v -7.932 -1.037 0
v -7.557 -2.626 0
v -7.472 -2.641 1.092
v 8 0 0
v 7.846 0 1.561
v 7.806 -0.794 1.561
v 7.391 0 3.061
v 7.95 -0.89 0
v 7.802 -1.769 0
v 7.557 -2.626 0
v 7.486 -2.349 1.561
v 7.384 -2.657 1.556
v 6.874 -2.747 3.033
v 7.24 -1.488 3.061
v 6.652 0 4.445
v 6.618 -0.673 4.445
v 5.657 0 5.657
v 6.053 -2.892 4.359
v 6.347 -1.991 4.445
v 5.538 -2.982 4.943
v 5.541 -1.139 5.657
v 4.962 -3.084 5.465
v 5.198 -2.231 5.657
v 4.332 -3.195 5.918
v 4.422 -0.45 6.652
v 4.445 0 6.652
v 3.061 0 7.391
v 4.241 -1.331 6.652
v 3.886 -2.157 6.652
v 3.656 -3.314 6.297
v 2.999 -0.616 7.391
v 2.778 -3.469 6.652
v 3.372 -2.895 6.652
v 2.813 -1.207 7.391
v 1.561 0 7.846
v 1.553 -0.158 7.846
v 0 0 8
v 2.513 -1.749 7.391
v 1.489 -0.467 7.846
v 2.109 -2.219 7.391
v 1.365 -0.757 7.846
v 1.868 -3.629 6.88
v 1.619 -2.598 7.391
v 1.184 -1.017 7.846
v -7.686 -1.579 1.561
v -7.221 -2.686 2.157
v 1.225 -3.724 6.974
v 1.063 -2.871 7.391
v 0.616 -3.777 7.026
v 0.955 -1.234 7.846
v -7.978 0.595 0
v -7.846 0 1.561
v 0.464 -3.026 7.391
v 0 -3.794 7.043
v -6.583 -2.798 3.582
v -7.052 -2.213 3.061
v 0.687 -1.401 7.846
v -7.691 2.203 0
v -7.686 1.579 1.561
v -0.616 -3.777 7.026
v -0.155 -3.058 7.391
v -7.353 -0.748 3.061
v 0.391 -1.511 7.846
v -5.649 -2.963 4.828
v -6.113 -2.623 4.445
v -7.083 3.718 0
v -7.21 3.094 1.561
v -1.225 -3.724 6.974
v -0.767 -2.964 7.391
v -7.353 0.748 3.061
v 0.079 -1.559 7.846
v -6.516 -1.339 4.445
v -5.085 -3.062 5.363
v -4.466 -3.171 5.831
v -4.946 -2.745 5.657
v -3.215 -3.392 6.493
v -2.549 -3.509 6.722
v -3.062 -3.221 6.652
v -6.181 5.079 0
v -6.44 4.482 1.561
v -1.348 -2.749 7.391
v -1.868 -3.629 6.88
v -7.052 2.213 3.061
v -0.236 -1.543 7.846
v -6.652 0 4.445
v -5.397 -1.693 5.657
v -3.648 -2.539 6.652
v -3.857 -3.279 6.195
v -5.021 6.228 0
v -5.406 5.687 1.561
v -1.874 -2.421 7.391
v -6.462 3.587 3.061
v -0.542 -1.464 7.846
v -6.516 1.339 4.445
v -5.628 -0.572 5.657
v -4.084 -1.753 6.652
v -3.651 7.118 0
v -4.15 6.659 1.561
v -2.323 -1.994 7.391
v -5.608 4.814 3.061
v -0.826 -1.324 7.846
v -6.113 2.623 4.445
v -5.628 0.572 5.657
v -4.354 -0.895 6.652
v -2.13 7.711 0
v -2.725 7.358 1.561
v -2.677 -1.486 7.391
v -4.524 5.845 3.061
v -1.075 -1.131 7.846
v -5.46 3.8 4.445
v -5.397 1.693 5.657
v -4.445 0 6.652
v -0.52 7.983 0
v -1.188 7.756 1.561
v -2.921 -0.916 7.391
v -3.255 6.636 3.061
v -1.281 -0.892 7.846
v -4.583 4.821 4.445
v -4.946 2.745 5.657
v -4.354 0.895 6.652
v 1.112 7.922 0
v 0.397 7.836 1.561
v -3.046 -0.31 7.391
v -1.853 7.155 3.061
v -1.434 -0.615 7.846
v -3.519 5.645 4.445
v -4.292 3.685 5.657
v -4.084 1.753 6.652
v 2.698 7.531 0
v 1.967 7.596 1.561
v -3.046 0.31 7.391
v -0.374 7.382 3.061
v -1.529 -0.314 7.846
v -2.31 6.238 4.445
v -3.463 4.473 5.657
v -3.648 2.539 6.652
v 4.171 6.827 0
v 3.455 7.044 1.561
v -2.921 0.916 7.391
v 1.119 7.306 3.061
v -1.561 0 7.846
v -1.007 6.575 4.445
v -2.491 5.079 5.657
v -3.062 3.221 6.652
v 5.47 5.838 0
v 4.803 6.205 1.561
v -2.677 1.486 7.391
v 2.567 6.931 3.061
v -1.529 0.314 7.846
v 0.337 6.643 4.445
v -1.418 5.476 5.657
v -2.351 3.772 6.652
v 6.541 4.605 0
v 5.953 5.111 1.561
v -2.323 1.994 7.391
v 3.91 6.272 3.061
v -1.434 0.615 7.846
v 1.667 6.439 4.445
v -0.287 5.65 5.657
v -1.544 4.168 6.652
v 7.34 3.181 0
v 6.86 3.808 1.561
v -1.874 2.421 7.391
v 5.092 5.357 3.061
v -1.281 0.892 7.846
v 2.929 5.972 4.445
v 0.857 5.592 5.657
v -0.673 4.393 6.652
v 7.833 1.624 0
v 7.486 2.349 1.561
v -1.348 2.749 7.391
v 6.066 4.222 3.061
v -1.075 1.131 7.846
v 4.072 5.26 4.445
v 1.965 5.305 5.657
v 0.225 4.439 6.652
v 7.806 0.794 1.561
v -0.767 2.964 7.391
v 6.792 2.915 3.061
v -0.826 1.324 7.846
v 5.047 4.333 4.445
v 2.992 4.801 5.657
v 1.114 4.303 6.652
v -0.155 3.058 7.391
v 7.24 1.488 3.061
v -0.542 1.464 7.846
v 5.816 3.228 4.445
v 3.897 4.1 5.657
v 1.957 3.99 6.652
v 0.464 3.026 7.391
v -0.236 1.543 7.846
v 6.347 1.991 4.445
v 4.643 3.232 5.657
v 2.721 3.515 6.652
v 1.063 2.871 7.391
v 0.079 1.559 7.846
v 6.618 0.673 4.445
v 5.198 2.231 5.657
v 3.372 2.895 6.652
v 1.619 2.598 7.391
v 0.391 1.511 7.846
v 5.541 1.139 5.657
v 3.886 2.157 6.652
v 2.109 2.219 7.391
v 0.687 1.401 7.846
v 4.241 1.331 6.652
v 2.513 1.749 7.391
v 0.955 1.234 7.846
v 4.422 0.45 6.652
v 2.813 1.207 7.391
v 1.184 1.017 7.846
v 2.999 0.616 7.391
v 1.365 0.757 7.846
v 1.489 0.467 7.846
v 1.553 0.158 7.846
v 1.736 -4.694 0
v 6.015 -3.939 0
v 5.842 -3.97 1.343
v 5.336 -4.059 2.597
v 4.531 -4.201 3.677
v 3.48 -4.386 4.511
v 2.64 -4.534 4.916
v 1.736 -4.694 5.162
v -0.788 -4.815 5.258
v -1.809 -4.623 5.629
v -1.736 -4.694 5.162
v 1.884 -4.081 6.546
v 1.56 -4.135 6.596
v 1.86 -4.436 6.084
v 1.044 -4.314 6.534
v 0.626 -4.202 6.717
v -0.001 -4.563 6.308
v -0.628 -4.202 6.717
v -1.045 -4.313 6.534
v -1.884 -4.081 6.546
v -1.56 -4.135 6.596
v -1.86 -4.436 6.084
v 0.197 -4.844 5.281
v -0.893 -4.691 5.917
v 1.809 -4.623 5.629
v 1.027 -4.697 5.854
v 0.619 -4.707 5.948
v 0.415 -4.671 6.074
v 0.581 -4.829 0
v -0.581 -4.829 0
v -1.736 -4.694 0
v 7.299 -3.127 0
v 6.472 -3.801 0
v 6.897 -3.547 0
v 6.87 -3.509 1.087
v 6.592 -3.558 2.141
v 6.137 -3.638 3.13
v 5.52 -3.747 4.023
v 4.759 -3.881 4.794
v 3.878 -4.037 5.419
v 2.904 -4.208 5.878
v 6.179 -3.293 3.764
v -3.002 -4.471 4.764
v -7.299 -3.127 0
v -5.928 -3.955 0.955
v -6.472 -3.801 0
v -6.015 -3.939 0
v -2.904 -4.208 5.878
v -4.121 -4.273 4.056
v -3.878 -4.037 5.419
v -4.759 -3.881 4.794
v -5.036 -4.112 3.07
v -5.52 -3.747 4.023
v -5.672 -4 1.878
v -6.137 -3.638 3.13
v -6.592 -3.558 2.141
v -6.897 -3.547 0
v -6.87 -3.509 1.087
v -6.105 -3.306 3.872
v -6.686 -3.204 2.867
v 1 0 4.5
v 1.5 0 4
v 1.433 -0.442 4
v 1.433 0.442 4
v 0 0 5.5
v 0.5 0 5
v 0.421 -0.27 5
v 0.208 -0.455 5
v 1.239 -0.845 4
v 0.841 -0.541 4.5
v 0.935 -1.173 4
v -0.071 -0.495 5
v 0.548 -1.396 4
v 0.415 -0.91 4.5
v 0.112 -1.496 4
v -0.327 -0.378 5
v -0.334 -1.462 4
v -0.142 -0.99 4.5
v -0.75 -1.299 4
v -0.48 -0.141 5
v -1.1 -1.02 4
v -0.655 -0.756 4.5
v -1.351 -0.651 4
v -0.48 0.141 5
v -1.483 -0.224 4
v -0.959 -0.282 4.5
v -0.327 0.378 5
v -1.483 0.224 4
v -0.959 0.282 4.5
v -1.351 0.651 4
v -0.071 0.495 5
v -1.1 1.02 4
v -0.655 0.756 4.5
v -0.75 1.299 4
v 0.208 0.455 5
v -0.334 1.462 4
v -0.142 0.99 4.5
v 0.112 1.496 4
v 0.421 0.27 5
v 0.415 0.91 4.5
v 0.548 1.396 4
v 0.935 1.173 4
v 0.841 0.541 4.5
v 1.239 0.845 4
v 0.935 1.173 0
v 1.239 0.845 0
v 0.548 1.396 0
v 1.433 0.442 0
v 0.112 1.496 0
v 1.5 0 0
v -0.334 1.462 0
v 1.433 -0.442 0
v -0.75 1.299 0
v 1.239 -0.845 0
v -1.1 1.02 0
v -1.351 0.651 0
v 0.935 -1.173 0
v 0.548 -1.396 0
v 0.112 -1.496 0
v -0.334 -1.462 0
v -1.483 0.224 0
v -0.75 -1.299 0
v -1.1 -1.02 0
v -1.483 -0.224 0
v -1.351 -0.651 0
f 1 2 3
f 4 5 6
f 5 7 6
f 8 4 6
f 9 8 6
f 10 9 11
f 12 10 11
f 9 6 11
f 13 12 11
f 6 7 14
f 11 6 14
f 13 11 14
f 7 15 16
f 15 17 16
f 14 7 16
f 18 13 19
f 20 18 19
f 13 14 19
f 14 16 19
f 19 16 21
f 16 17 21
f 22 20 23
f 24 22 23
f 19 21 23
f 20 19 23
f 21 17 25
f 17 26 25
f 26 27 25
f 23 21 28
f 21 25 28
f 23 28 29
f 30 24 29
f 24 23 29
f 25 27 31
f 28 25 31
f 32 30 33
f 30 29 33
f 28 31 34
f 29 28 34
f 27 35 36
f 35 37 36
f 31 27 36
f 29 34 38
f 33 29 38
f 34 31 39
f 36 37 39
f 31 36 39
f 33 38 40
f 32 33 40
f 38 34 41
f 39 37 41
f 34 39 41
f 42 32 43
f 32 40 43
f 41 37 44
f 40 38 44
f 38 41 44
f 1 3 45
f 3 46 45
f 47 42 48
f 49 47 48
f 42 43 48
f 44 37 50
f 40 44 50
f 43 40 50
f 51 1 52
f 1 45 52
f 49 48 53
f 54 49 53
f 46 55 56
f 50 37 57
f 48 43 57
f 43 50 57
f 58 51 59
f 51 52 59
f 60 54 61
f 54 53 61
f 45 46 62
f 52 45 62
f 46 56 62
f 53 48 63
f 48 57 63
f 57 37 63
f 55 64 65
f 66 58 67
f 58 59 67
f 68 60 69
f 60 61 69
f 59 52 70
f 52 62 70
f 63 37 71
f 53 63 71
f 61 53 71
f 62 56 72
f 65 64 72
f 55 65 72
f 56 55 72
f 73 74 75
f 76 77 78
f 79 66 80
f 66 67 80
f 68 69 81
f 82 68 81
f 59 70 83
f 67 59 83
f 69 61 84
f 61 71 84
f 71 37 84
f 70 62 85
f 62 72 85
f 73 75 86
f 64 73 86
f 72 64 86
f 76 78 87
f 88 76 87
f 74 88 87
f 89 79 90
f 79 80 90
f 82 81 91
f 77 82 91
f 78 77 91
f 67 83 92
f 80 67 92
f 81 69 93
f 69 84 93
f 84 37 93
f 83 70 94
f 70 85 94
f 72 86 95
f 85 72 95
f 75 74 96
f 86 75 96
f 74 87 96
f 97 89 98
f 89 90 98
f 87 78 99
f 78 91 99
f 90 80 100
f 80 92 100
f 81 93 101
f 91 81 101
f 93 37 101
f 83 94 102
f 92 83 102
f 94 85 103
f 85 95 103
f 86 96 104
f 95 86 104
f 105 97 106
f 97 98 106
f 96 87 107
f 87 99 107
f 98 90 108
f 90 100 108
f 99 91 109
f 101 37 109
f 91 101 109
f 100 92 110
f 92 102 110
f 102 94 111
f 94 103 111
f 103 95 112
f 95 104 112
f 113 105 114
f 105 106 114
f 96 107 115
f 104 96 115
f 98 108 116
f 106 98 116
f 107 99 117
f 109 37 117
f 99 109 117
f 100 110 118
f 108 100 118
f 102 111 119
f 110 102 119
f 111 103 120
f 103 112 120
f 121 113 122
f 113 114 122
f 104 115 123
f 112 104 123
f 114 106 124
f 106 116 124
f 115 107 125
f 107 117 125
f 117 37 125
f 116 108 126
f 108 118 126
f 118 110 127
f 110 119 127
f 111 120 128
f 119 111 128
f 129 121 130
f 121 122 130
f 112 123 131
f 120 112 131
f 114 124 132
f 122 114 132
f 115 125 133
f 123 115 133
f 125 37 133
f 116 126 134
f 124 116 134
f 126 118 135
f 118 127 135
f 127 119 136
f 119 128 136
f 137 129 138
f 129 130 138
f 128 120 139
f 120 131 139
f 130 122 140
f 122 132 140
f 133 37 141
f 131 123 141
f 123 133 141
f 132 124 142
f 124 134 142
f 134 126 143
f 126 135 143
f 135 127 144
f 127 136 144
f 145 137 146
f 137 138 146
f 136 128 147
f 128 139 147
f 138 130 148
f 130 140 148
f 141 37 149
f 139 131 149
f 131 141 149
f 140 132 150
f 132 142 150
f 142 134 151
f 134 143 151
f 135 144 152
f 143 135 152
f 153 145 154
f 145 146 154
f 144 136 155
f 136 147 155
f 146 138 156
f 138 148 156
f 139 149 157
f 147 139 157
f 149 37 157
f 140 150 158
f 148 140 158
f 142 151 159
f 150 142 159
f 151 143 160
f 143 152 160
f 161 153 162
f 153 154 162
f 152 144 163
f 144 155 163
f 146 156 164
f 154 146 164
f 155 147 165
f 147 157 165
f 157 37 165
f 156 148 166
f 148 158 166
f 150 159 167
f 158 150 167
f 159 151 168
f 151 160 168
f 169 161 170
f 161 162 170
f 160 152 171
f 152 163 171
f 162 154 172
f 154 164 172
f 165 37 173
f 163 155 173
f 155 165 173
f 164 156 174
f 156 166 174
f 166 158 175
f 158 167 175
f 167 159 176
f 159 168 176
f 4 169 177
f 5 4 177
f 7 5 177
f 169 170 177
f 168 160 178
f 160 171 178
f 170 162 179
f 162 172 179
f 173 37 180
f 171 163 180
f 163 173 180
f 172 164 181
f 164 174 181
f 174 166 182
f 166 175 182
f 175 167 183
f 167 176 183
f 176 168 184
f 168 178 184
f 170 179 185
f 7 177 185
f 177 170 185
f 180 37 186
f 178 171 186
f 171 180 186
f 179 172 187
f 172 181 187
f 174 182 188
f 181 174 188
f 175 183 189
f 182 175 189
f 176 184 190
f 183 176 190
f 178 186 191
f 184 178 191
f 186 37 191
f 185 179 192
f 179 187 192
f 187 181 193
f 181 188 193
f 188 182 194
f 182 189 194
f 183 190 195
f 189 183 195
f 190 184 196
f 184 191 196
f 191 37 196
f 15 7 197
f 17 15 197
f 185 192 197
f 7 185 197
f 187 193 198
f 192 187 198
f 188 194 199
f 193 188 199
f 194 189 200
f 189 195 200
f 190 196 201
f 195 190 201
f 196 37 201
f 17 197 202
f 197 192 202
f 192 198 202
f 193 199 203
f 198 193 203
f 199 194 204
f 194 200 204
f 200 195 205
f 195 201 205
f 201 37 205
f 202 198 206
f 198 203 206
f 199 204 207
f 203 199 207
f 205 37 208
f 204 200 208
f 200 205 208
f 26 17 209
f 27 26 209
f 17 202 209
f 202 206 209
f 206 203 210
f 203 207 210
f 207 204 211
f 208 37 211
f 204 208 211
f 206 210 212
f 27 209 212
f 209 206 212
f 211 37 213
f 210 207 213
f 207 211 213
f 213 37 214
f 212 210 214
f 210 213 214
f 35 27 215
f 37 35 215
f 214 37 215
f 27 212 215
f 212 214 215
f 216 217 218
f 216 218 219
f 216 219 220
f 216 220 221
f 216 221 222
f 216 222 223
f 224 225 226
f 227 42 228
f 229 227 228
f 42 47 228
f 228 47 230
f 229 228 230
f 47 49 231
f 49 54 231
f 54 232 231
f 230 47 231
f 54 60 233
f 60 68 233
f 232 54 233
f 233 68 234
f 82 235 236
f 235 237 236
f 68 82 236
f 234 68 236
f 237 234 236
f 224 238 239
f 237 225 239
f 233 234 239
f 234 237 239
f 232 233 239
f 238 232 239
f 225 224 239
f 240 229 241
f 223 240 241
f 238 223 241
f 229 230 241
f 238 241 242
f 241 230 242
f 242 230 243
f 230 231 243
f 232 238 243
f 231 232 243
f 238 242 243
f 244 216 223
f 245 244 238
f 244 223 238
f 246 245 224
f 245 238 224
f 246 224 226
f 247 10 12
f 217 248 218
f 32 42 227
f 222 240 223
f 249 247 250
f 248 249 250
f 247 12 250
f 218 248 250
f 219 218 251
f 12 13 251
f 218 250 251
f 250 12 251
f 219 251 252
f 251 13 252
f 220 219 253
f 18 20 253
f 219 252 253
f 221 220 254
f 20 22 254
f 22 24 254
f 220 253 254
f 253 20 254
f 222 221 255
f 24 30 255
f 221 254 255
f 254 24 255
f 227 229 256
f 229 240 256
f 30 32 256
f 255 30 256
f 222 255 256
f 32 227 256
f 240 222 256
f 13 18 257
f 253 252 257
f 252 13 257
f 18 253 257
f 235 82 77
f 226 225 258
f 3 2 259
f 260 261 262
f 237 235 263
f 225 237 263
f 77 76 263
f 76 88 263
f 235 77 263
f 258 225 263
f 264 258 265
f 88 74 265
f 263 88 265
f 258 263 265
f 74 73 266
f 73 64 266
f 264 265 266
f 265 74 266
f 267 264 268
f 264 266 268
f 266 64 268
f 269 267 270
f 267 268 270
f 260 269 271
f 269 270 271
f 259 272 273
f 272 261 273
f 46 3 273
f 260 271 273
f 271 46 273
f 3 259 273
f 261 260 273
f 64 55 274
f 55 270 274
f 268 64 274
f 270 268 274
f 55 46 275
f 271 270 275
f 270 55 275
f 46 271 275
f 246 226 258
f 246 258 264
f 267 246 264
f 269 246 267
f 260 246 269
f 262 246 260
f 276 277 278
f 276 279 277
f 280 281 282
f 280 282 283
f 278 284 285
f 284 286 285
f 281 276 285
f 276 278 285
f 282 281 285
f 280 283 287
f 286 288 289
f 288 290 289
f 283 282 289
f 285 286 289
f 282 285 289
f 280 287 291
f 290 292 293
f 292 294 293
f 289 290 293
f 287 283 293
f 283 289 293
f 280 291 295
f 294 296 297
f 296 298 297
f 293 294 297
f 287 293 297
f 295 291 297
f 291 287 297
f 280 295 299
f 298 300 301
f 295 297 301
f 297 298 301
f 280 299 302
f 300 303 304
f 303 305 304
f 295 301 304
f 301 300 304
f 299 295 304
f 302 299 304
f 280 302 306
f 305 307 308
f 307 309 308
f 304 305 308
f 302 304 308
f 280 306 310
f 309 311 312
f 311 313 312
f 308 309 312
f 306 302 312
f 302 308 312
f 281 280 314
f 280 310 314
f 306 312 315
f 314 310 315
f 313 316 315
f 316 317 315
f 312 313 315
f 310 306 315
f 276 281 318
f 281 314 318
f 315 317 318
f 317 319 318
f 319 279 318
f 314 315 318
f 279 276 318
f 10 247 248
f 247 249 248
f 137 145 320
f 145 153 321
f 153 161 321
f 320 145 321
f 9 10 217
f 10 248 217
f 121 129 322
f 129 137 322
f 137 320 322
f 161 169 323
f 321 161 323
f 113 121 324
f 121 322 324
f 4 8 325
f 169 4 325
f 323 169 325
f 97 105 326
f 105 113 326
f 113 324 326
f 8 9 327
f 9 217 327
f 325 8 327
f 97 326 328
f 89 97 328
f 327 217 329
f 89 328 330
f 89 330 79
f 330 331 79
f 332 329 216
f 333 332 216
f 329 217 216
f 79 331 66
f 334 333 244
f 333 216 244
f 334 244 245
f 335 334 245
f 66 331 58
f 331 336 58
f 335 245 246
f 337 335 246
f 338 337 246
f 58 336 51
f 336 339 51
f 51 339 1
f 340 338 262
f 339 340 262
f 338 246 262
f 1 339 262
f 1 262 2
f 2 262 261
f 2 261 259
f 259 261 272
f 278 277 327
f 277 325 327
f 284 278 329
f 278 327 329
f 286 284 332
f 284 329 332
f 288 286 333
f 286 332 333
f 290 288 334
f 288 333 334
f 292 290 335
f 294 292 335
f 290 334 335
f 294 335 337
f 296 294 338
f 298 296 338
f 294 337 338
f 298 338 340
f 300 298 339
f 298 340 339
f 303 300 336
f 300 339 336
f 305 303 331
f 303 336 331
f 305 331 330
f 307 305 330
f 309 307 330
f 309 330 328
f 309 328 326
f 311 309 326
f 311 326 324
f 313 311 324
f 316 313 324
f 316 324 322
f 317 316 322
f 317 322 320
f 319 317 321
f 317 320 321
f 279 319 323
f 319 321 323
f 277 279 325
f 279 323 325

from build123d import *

# Parameters (mm, degrees)
F3_DEPTH = 25
F4_R     = 10
F5_R     = 2


with BuildPart() as f1:
    # F0 (on Front) → F1 (revolve)
    with BuildSketch(Plane.XZ):
        with BuildLine():
            Line((0, 5.5), (1.5, 4))
            Line((1.5, 4), (1.5, 0))
            Line((1.5, 0), (8, 0))
            ThreePointArc((8, 0), (5.6568542495, 5.6568542495), (0, 8))
            Line((0, 8), (0, 5.5))
        make_face()
    revolve(axis=Axis((0, 0, 2.75), (0, 0, -1)))

    # F2 (on Top) → F3 (cut)
    with BuildSketch(Plane.XY):
        Polygon((28.3564090981, 0), (0, -5), (-28.3564090981, 0), (-28.3564090981, -16.375022141), (0, -16.375022141), (28.3564090981, -16.375022141), align=None)
    extrude(amount=F3_DEPTH, mode=Mode.SUBTRACT)

    # F4
    f4_edges = [f1.edges().sort_by_distance(p)[0] for p in [
        (0, -5, 3.122499),
    ]]
    fillet(f4_edges, radius=F4_R)

    # F5
    f5_edges = [f1.edges().sort_by_distance(p)[0] for p in [
        (-5.546967, -4.02192, 4.129808),
    ]]
    fillet(f5_edges, radius=F5_R)


solid = f1.part
